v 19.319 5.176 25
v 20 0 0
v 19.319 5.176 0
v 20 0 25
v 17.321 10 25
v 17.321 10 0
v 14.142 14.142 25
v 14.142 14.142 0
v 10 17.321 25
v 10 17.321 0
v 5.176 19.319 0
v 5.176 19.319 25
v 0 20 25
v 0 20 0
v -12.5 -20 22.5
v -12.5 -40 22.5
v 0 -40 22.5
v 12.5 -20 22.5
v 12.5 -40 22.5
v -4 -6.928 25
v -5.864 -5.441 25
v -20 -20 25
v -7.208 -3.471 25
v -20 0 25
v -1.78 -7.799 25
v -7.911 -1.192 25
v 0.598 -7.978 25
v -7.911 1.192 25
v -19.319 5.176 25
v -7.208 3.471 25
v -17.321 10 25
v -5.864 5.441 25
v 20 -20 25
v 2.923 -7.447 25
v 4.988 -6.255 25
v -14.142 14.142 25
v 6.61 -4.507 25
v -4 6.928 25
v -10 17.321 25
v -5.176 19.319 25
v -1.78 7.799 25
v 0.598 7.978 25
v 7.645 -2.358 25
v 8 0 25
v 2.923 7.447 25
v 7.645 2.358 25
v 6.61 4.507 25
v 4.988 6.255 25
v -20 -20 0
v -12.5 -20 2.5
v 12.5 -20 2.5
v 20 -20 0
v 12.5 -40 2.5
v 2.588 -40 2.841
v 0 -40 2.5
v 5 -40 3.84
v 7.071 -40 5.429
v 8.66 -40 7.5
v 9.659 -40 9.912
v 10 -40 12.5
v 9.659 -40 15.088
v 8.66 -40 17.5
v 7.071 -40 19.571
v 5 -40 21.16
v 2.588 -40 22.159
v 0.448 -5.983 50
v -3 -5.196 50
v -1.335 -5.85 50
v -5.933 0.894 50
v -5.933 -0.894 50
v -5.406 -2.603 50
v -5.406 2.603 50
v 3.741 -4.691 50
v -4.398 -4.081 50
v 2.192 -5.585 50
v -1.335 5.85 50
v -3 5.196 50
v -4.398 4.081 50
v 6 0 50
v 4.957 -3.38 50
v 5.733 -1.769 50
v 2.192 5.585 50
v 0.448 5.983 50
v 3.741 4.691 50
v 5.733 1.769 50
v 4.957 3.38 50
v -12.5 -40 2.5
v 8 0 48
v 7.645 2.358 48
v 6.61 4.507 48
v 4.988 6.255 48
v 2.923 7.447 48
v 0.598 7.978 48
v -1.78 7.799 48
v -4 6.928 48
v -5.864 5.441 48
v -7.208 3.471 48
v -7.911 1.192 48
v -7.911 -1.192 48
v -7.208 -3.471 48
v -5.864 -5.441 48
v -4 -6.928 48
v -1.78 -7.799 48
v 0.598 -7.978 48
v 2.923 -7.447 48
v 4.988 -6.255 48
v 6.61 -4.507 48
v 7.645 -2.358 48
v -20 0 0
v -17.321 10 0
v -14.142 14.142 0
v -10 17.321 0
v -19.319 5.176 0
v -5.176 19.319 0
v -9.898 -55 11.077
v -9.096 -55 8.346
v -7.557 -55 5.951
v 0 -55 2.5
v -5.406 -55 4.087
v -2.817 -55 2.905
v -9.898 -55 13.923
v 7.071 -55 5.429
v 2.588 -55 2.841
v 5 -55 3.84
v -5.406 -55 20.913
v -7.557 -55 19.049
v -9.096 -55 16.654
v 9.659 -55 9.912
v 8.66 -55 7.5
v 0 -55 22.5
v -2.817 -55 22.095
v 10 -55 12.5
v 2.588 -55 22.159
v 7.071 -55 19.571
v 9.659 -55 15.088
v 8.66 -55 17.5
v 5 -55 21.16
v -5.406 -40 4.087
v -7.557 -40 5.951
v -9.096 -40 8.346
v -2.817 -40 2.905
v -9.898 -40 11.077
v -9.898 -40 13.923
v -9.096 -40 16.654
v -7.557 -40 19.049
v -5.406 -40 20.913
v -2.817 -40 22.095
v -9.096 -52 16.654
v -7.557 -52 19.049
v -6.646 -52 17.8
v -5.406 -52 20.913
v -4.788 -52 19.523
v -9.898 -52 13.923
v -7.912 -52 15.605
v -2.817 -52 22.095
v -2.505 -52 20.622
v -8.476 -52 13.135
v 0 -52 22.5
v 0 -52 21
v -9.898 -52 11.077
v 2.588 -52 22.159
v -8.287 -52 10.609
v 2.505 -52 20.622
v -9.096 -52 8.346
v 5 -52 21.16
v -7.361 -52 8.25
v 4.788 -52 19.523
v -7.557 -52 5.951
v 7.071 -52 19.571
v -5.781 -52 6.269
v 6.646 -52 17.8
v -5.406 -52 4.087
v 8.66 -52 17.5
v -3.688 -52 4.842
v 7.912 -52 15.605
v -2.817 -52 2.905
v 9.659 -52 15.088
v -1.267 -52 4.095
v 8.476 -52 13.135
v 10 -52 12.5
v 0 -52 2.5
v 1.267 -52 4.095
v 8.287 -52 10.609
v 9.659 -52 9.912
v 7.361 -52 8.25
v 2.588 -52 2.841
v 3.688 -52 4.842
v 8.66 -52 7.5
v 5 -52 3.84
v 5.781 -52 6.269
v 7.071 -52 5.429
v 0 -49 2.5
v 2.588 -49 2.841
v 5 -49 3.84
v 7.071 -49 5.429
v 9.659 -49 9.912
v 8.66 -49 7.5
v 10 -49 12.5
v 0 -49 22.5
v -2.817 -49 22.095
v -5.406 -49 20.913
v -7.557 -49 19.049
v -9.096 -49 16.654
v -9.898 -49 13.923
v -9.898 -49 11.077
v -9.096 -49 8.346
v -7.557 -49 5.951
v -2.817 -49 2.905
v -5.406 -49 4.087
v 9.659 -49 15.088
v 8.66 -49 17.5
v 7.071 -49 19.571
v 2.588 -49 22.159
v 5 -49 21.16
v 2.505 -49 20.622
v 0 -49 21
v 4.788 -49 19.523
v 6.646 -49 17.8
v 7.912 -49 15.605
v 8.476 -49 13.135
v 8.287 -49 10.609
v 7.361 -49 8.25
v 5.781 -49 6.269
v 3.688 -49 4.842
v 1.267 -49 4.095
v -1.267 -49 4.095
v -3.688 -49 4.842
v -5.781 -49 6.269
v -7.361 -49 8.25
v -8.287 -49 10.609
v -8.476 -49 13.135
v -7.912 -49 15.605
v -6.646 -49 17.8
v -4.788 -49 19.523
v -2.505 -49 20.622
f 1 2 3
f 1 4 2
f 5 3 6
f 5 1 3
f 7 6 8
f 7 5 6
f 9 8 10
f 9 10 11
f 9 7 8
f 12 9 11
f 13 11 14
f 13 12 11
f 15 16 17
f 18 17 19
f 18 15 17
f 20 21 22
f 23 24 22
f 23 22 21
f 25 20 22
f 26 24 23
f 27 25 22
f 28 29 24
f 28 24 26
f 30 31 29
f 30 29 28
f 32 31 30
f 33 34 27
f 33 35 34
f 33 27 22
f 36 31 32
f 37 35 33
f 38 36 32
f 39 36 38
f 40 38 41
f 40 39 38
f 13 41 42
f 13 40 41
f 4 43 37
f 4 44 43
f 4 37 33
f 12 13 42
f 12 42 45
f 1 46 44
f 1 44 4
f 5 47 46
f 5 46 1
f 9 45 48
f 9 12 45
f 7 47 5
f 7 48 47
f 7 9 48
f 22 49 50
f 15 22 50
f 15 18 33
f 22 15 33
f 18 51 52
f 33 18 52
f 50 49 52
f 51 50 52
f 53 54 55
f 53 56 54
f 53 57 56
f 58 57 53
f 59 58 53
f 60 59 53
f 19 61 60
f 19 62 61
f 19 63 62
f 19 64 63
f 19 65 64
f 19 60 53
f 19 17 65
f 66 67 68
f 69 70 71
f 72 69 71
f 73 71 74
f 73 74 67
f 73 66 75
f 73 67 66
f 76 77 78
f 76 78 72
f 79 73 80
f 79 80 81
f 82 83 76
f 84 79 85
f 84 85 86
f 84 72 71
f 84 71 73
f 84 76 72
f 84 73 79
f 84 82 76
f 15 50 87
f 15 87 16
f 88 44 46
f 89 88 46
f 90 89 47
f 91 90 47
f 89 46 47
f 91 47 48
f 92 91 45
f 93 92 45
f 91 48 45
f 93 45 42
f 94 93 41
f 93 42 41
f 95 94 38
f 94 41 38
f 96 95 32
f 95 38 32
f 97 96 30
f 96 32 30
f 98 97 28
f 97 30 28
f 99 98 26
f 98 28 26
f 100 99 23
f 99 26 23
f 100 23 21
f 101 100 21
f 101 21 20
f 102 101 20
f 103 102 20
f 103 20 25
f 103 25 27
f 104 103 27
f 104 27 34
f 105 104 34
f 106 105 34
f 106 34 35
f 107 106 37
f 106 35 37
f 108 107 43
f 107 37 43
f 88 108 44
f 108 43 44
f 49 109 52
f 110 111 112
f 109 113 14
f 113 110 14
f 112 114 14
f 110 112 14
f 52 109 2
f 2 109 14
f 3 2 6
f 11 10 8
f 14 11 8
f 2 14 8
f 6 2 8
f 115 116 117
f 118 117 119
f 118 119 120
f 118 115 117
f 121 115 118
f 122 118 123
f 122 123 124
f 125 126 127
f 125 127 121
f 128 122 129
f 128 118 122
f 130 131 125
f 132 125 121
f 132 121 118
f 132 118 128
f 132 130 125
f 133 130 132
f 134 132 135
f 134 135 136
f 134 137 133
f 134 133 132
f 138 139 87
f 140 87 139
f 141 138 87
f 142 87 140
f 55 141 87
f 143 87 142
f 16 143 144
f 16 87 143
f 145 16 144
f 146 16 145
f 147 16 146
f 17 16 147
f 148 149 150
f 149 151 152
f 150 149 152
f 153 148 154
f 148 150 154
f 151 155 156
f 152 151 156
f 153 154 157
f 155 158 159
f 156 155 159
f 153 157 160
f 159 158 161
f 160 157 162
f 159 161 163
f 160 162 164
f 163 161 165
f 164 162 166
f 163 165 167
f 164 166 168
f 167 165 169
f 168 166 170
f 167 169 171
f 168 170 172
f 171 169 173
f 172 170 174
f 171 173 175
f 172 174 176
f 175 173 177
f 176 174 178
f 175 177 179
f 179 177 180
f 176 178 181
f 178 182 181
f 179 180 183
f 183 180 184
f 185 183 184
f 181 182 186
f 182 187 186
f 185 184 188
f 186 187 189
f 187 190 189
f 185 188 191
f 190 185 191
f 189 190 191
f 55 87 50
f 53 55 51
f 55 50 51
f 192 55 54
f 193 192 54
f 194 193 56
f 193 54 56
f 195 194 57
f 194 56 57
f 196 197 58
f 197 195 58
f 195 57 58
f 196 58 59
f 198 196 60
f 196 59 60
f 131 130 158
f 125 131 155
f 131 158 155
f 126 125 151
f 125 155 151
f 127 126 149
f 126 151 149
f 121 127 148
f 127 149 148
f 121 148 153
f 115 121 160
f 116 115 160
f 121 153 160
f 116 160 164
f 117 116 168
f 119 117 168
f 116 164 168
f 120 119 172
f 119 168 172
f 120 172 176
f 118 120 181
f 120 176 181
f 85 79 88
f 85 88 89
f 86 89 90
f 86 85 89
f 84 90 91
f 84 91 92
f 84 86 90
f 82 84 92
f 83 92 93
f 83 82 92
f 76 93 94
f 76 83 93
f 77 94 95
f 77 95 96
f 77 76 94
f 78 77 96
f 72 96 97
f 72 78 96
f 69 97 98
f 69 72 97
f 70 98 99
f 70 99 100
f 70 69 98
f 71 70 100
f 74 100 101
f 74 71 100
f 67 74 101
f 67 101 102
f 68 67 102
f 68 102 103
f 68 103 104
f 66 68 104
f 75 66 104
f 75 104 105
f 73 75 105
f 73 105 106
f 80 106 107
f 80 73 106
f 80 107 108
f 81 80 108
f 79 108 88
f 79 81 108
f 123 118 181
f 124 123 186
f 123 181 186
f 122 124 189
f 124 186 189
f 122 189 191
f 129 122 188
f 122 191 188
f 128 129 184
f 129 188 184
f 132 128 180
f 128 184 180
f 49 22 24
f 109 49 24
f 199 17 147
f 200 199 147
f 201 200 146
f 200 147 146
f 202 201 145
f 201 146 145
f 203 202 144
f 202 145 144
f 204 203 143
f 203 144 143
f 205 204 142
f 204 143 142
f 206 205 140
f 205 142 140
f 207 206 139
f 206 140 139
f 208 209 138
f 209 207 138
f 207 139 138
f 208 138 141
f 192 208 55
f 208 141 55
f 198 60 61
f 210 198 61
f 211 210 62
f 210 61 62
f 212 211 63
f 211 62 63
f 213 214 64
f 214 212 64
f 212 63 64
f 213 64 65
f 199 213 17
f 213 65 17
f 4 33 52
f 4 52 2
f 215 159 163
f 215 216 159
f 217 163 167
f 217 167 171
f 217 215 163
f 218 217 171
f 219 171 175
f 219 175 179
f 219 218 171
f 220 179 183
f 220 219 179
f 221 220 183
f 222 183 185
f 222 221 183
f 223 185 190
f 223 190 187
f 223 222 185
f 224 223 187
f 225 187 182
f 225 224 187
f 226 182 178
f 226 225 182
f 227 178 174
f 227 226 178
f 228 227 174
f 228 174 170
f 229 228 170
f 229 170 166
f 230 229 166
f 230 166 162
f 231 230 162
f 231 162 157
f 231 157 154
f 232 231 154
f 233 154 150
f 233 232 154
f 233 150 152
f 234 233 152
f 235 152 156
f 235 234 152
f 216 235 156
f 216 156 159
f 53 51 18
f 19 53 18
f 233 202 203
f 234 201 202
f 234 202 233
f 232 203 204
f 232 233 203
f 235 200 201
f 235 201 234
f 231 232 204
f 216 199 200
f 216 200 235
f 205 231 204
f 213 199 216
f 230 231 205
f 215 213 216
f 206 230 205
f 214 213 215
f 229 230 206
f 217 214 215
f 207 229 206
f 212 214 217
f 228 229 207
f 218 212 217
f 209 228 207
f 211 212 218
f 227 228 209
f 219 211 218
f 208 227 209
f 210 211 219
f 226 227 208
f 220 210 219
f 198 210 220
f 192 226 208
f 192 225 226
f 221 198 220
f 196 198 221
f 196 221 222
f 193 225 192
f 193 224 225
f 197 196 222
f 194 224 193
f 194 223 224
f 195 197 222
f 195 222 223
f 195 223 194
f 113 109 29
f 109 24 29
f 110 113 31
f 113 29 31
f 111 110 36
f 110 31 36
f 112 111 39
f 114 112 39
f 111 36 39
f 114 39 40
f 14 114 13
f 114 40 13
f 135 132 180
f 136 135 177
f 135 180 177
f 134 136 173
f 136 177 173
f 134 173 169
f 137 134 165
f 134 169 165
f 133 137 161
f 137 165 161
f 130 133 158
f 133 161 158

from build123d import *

# Parameters (mm, degrees)
F0_W     = 40
F0_H     = 40
F1_DEPTH = 25
F2_R     = 19.99999
F3_W     = 25
F3_H     = 20
F4_DEPTH = 20
F6_DEPTH = 15
F7_R     = 8
F8_DEPTH = 25
F9_SIZE  = 2
F10_W    = 3
F10_H    = 3


# Not quite as in the source:
# - a fillet or chamfer is up to 0.001 mm smaller than in the source, because OpenCascade refuses the exact size


with BuildPart() as f1:
    # F0 (on Top) → F1 (new body)
    with BuildSketch(Plane.XY):
        Rectangle(F0_W, F0_H)
    extrude(amount=F1_DEPTH)

    # F2 (radius 20 in the source; OpenCascade refuses exactly that, so slightly less here)
    f2_edges = [f1.edges().sort_by_distance(p)[0] for p in [
        (20, 20, 12.5),
        (-20, 20, 12.5),
    ]]
    fillet(f2_edges, radius=F2_R)

    # F3 (on face) → F4 (join)
    with BuildSketch(Plane.XZ.offset(20)):
        with Locations((0, 12.5)):
            Rectangle(F3_W, F3_H)
    extrude(amount=F4_DEPTH)

    # F5 (on face) → F6 (join)
    with BuildSketch(Plane.XZ.offset(40)):
        with BuildLine():
            ThreePointArc((0, 2.5), (7.0710678119, 5.4289321881), (10, 12.5))
            ThreePointArc((10, 12.5), (7.0710678119, 19.5710678119), (0, 22.5))
            ThreePointArc((0, 22.5), (-10, 12.5), (0, 2.5))
        make_face()
    extrude(amount=F6_DEPTH)

    # F7 (on face) → F8 (join)
    with BuildSketch(Plane.XY.offset(25)):
        Circle(F7_R)
    extrude(amount=F8_DEPTH)

    # F9
    f9_edges = [f1.edges().sort_by_distance(p)[0] for p in [
        (-8, 0, 50),
    ]]
    chamfer(f9_edges, length=F9_SIZE)

    # F10 (on Right) → F11 (revolve, cut)
    with BuildSketch(Plane.YZ):
        with Locations((-50.5, 22.5)):
            Rectangle(F10_W, F10_H)
    revolve(axis=Axis((0, -40, 12.5), (0, 1, 0)), mode=Mode.SUBTRACT)


solid = f1.part
